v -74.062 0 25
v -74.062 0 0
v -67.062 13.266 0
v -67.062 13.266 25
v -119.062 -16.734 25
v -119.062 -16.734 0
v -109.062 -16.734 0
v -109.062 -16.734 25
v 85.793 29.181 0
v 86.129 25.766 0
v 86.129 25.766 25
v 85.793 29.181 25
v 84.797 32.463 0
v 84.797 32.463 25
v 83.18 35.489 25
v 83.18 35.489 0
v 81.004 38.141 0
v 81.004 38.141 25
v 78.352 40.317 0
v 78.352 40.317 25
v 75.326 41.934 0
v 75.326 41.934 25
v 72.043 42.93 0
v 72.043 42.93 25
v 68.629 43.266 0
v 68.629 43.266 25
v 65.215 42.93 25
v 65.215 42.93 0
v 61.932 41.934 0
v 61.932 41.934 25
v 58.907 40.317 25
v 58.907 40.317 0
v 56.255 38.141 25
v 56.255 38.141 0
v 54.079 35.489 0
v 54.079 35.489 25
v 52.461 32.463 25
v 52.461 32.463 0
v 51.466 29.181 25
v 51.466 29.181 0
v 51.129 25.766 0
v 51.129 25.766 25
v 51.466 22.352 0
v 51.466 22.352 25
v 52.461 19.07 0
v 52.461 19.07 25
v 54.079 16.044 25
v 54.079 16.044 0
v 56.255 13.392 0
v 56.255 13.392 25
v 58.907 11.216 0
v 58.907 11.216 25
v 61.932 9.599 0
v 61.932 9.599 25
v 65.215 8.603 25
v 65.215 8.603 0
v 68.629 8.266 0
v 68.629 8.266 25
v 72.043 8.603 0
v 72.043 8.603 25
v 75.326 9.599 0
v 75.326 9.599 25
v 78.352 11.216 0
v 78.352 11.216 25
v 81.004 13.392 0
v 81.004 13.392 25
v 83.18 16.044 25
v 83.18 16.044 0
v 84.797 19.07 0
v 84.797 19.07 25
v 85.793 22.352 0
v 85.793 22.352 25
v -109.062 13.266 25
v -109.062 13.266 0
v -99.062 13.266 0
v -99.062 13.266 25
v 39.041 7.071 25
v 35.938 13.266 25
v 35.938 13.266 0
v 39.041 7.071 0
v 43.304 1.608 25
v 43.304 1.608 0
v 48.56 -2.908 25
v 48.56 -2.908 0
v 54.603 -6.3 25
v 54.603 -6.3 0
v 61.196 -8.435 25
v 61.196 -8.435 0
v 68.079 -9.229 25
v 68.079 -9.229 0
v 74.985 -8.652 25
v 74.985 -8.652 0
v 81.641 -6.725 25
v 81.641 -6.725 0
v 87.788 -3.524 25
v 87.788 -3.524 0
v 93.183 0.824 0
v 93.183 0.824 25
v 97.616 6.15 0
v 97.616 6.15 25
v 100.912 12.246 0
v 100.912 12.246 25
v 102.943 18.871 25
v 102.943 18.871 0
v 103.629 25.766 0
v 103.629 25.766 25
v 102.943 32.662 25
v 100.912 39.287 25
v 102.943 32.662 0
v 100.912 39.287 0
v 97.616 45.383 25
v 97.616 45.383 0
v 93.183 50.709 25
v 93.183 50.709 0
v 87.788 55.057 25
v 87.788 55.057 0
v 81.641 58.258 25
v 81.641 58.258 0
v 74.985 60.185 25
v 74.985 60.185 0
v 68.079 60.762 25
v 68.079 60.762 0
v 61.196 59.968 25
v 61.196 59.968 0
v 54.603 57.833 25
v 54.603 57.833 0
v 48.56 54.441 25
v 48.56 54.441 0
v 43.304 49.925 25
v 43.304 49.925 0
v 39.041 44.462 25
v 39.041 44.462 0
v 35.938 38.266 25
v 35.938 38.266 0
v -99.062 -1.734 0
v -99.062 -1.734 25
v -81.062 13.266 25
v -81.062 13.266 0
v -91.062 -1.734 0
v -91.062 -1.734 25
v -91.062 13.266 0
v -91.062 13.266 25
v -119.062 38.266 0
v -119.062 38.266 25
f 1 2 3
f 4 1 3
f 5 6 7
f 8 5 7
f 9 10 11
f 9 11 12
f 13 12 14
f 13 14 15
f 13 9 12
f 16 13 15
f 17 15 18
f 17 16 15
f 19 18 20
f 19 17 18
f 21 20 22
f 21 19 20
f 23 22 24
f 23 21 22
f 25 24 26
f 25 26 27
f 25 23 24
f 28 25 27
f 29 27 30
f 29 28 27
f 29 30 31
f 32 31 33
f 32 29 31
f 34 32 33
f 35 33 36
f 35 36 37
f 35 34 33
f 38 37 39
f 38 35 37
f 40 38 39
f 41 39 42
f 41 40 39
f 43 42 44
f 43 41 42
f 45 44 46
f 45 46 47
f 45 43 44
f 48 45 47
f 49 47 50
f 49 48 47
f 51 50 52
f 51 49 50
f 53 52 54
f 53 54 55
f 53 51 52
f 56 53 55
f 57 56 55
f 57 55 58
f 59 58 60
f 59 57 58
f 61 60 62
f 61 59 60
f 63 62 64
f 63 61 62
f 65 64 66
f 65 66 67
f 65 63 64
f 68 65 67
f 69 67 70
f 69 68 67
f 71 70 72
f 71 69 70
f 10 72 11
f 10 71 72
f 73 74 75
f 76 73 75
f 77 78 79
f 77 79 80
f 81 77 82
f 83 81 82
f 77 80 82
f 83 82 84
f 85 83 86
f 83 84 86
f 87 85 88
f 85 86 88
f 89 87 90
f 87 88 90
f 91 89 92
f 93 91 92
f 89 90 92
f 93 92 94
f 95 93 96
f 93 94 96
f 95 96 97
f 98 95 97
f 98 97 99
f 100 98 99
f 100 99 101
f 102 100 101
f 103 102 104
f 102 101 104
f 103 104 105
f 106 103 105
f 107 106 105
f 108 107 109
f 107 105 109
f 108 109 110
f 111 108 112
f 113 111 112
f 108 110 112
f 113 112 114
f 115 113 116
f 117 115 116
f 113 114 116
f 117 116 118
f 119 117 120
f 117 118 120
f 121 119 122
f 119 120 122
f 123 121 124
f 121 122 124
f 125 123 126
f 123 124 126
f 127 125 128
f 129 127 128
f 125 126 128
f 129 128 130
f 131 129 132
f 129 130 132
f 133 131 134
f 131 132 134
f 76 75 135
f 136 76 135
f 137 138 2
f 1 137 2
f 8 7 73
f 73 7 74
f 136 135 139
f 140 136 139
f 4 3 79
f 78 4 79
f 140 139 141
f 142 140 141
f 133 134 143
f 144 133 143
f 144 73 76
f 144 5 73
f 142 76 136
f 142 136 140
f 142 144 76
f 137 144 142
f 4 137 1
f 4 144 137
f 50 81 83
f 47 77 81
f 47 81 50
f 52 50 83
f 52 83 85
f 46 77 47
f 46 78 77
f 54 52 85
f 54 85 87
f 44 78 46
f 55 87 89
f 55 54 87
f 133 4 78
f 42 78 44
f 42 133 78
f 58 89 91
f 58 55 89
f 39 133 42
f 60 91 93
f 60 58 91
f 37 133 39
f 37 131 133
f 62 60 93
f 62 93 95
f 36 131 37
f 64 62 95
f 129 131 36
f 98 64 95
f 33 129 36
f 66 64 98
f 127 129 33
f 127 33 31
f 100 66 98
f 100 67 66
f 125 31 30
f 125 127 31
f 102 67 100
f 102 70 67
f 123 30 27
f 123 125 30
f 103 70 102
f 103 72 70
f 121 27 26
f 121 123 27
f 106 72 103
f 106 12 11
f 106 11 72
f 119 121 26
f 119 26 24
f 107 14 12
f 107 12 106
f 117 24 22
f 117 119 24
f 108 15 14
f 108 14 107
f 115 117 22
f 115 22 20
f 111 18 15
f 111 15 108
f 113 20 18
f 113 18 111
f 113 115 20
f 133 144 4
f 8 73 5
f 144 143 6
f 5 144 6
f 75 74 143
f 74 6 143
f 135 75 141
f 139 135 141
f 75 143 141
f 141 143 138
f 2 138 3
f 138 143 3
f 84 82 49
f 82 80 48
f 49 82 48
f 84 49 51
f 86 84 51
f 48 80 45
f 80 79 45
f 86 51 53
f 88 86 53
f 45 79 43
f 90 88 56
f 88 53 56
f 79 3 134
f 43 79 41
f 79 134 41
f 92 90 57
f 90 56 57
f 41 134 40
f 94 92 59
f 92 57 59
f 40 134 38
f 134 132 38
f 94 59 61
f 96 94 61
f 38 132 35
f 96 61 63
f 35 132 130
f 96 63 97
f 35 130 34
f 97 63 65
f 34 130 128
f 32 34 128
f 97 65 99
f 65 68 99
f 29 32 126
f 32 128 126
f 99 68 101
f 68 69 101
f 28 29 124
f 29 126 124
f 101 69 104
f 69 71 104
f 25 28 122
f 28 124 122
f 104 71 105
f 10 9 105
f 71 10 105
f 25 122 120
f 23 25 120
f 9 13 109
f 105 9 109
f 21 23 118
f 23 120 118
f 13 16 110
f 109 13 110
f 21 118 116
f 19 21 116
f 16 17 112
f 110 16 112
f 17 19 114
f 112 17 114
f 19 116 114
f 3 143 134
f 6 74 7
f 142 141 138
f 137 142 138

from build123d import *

# Parameters (mm, degrees)
F0_R     = 17.5
F1_DEPTH = 25


with BuildPart() as f1:
    # F0 (on Top) → F1 (new body)
    with BuildSketch(Plane.XY):
        with BuildLine():
            Line((35.937557, 38.266499), (-119.062443, 38.266499))
            Line((-119.062443, 38.266499), (-119.062443, 13.266499))
            Line((-119.062443, 13.266499), (-119.062443, -16.733501))
            Line((-119.062443, -16.733501), (-109.062443, -16.733501))
            Line((-109.062443, -16.733501), (-109.062443, 13.266499))
            Line((-109.062443, 13.266499), (-99.062443, 13.266499))
            Line((-99.062443, 13.266499), (-99.062443, -1.733501))
            Line((-99.062443, -1.733501), (-91.062443, -1.733501))
            Line((-91.062443, -1.733501), (-91.062443, 13.266499))
            Line((-91.062443, 13.266499), (-81.062443, 13.266499))
            Line((-81.062443, 13.266499), (-74.062443, 0))
            Line((-74.062443, 0), (-67.062443, 13.266499))
            Line((-67.062443, 13.266499), (35.937557, 13.266499))
            ThreePointArc((35.937557, 13.266499), (103.629299, 25.766499), (35.937557, 38.266499))
        make_face()
        with Locations((68.629299, 25.766499)):
            Circle(F0_R, mode=Mode.SUBTRACT)
    extrude(amount=F1_DEPTH)


solid = f1.part
